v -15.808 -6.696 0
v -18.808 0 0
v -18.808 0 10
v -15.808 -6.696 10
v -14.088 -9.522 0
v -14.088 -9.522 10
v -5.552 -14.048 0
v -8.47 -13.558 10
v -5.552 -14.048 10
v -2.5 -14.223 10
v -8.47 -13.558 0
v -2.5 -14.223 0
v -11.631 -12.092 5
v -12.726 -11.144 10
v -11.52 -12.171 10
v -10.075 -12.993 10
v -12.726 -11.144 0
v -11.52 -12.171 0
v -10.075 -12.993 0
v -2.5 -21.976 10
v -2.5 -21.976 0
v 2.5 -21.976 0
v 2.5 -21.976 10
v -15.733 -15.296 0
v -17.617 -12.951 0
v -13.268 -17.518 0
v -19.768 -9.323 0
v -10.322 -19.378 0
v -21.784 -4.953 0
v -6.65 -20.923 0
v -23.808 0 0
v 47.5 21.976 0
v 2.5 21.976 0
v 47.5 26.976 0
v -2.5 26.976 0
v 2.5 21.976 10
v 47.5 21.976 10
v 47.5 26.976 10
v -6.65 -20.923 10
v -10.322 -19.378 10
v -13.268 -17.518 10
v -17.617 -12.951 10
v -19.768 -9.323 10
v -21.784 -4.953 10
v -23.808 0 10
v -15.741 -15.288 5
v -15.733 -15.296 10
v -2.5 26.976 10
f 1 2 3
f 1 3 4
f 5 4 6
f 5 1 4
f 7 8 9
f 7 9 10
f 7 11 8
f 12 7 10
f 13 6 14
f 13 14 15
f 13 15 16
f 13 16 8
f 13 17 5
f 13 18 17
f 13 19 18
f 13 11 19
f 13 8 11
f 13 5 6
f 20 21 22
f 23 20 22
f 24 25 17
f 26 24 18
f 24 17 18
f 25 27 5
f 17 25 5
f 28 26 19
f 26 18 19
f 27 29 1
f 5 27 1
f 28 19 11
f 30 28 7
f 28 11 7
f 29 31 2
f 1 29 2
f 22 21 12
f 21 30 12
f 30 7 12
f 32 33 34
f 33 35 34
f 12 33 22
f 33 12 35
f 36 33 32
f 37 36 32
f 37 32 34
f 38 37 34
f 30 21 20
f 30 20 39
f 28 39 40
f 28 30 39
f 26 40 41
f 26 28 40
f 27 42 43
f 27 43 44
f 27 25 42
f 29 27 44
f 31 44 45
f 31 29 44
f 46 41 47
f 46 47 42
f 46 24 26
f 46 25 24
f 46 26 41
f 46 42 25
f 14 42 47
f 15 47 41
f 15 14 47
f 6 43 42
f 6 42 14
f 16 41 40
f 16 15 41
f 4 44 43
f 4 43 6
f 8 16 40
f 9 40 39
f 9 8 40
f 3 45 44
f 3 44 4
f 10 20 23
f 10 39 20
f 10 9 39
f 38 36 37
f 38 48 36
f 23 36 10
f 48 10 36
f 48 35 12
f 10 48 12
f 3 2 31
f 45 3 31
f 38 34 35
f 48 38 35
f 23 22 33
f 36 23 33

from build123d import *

# Parameters (mm, degrees)
F1_DEPTH = 10


with BuildPart() as f1:
    # F0 (on Top) → F1 (new body)
    with BuildSketch(Plane.XY):
        with BuildLine():
            Line((-2.5, -21.9755824495), (2.5, -21.9755824495))
            Line((2.5, -21.9755824495), (2.5, 21.9755824495))
            Line((2.5, 21.9755824495), (47.5, 21.9755824495))
            Line((47.5, 21.9755824495), (47.5, 26.9755824495))
            Line((47.5, 26.9755824495), (-2.5, 26.9755824495))
            Line((-2.5, 26.9755824495), (-2.5, 21.9755824495))
            Line((-2.5, 21.9755824495), (-2.5, -14.2228389159))
            add(Edge.make_bspline(
                [(-18.8081365824, 0), (-16.7830632678, -4.900555724), (-13.1043678113, -13.8027776567), (-5.7885545713, -14.0925723692), (-2.5, -14.2228389159)],
                knots=[0, 0, 0, 0, 0.5504868067, 1, 1, 1, 1], degree=3))
            Line((-18.8081365824, 0), (-23.8081365824, 0))
            add(Edge.make_bspline(
                [(-2.5, -21.9755824495), (-8.0809096282, -20.9474647123), (-17.3359240555, -16.3424369165), (-21.2225849489, -6.4176707959), (-23.8081365824, 0)],
                knots=[0, 0, 0, 0, 0.4808804759, 1, 1, 1, 1], degree=3))
        make_face()
    extrude(amount=F1_DEPTH)


solid = f1.part
